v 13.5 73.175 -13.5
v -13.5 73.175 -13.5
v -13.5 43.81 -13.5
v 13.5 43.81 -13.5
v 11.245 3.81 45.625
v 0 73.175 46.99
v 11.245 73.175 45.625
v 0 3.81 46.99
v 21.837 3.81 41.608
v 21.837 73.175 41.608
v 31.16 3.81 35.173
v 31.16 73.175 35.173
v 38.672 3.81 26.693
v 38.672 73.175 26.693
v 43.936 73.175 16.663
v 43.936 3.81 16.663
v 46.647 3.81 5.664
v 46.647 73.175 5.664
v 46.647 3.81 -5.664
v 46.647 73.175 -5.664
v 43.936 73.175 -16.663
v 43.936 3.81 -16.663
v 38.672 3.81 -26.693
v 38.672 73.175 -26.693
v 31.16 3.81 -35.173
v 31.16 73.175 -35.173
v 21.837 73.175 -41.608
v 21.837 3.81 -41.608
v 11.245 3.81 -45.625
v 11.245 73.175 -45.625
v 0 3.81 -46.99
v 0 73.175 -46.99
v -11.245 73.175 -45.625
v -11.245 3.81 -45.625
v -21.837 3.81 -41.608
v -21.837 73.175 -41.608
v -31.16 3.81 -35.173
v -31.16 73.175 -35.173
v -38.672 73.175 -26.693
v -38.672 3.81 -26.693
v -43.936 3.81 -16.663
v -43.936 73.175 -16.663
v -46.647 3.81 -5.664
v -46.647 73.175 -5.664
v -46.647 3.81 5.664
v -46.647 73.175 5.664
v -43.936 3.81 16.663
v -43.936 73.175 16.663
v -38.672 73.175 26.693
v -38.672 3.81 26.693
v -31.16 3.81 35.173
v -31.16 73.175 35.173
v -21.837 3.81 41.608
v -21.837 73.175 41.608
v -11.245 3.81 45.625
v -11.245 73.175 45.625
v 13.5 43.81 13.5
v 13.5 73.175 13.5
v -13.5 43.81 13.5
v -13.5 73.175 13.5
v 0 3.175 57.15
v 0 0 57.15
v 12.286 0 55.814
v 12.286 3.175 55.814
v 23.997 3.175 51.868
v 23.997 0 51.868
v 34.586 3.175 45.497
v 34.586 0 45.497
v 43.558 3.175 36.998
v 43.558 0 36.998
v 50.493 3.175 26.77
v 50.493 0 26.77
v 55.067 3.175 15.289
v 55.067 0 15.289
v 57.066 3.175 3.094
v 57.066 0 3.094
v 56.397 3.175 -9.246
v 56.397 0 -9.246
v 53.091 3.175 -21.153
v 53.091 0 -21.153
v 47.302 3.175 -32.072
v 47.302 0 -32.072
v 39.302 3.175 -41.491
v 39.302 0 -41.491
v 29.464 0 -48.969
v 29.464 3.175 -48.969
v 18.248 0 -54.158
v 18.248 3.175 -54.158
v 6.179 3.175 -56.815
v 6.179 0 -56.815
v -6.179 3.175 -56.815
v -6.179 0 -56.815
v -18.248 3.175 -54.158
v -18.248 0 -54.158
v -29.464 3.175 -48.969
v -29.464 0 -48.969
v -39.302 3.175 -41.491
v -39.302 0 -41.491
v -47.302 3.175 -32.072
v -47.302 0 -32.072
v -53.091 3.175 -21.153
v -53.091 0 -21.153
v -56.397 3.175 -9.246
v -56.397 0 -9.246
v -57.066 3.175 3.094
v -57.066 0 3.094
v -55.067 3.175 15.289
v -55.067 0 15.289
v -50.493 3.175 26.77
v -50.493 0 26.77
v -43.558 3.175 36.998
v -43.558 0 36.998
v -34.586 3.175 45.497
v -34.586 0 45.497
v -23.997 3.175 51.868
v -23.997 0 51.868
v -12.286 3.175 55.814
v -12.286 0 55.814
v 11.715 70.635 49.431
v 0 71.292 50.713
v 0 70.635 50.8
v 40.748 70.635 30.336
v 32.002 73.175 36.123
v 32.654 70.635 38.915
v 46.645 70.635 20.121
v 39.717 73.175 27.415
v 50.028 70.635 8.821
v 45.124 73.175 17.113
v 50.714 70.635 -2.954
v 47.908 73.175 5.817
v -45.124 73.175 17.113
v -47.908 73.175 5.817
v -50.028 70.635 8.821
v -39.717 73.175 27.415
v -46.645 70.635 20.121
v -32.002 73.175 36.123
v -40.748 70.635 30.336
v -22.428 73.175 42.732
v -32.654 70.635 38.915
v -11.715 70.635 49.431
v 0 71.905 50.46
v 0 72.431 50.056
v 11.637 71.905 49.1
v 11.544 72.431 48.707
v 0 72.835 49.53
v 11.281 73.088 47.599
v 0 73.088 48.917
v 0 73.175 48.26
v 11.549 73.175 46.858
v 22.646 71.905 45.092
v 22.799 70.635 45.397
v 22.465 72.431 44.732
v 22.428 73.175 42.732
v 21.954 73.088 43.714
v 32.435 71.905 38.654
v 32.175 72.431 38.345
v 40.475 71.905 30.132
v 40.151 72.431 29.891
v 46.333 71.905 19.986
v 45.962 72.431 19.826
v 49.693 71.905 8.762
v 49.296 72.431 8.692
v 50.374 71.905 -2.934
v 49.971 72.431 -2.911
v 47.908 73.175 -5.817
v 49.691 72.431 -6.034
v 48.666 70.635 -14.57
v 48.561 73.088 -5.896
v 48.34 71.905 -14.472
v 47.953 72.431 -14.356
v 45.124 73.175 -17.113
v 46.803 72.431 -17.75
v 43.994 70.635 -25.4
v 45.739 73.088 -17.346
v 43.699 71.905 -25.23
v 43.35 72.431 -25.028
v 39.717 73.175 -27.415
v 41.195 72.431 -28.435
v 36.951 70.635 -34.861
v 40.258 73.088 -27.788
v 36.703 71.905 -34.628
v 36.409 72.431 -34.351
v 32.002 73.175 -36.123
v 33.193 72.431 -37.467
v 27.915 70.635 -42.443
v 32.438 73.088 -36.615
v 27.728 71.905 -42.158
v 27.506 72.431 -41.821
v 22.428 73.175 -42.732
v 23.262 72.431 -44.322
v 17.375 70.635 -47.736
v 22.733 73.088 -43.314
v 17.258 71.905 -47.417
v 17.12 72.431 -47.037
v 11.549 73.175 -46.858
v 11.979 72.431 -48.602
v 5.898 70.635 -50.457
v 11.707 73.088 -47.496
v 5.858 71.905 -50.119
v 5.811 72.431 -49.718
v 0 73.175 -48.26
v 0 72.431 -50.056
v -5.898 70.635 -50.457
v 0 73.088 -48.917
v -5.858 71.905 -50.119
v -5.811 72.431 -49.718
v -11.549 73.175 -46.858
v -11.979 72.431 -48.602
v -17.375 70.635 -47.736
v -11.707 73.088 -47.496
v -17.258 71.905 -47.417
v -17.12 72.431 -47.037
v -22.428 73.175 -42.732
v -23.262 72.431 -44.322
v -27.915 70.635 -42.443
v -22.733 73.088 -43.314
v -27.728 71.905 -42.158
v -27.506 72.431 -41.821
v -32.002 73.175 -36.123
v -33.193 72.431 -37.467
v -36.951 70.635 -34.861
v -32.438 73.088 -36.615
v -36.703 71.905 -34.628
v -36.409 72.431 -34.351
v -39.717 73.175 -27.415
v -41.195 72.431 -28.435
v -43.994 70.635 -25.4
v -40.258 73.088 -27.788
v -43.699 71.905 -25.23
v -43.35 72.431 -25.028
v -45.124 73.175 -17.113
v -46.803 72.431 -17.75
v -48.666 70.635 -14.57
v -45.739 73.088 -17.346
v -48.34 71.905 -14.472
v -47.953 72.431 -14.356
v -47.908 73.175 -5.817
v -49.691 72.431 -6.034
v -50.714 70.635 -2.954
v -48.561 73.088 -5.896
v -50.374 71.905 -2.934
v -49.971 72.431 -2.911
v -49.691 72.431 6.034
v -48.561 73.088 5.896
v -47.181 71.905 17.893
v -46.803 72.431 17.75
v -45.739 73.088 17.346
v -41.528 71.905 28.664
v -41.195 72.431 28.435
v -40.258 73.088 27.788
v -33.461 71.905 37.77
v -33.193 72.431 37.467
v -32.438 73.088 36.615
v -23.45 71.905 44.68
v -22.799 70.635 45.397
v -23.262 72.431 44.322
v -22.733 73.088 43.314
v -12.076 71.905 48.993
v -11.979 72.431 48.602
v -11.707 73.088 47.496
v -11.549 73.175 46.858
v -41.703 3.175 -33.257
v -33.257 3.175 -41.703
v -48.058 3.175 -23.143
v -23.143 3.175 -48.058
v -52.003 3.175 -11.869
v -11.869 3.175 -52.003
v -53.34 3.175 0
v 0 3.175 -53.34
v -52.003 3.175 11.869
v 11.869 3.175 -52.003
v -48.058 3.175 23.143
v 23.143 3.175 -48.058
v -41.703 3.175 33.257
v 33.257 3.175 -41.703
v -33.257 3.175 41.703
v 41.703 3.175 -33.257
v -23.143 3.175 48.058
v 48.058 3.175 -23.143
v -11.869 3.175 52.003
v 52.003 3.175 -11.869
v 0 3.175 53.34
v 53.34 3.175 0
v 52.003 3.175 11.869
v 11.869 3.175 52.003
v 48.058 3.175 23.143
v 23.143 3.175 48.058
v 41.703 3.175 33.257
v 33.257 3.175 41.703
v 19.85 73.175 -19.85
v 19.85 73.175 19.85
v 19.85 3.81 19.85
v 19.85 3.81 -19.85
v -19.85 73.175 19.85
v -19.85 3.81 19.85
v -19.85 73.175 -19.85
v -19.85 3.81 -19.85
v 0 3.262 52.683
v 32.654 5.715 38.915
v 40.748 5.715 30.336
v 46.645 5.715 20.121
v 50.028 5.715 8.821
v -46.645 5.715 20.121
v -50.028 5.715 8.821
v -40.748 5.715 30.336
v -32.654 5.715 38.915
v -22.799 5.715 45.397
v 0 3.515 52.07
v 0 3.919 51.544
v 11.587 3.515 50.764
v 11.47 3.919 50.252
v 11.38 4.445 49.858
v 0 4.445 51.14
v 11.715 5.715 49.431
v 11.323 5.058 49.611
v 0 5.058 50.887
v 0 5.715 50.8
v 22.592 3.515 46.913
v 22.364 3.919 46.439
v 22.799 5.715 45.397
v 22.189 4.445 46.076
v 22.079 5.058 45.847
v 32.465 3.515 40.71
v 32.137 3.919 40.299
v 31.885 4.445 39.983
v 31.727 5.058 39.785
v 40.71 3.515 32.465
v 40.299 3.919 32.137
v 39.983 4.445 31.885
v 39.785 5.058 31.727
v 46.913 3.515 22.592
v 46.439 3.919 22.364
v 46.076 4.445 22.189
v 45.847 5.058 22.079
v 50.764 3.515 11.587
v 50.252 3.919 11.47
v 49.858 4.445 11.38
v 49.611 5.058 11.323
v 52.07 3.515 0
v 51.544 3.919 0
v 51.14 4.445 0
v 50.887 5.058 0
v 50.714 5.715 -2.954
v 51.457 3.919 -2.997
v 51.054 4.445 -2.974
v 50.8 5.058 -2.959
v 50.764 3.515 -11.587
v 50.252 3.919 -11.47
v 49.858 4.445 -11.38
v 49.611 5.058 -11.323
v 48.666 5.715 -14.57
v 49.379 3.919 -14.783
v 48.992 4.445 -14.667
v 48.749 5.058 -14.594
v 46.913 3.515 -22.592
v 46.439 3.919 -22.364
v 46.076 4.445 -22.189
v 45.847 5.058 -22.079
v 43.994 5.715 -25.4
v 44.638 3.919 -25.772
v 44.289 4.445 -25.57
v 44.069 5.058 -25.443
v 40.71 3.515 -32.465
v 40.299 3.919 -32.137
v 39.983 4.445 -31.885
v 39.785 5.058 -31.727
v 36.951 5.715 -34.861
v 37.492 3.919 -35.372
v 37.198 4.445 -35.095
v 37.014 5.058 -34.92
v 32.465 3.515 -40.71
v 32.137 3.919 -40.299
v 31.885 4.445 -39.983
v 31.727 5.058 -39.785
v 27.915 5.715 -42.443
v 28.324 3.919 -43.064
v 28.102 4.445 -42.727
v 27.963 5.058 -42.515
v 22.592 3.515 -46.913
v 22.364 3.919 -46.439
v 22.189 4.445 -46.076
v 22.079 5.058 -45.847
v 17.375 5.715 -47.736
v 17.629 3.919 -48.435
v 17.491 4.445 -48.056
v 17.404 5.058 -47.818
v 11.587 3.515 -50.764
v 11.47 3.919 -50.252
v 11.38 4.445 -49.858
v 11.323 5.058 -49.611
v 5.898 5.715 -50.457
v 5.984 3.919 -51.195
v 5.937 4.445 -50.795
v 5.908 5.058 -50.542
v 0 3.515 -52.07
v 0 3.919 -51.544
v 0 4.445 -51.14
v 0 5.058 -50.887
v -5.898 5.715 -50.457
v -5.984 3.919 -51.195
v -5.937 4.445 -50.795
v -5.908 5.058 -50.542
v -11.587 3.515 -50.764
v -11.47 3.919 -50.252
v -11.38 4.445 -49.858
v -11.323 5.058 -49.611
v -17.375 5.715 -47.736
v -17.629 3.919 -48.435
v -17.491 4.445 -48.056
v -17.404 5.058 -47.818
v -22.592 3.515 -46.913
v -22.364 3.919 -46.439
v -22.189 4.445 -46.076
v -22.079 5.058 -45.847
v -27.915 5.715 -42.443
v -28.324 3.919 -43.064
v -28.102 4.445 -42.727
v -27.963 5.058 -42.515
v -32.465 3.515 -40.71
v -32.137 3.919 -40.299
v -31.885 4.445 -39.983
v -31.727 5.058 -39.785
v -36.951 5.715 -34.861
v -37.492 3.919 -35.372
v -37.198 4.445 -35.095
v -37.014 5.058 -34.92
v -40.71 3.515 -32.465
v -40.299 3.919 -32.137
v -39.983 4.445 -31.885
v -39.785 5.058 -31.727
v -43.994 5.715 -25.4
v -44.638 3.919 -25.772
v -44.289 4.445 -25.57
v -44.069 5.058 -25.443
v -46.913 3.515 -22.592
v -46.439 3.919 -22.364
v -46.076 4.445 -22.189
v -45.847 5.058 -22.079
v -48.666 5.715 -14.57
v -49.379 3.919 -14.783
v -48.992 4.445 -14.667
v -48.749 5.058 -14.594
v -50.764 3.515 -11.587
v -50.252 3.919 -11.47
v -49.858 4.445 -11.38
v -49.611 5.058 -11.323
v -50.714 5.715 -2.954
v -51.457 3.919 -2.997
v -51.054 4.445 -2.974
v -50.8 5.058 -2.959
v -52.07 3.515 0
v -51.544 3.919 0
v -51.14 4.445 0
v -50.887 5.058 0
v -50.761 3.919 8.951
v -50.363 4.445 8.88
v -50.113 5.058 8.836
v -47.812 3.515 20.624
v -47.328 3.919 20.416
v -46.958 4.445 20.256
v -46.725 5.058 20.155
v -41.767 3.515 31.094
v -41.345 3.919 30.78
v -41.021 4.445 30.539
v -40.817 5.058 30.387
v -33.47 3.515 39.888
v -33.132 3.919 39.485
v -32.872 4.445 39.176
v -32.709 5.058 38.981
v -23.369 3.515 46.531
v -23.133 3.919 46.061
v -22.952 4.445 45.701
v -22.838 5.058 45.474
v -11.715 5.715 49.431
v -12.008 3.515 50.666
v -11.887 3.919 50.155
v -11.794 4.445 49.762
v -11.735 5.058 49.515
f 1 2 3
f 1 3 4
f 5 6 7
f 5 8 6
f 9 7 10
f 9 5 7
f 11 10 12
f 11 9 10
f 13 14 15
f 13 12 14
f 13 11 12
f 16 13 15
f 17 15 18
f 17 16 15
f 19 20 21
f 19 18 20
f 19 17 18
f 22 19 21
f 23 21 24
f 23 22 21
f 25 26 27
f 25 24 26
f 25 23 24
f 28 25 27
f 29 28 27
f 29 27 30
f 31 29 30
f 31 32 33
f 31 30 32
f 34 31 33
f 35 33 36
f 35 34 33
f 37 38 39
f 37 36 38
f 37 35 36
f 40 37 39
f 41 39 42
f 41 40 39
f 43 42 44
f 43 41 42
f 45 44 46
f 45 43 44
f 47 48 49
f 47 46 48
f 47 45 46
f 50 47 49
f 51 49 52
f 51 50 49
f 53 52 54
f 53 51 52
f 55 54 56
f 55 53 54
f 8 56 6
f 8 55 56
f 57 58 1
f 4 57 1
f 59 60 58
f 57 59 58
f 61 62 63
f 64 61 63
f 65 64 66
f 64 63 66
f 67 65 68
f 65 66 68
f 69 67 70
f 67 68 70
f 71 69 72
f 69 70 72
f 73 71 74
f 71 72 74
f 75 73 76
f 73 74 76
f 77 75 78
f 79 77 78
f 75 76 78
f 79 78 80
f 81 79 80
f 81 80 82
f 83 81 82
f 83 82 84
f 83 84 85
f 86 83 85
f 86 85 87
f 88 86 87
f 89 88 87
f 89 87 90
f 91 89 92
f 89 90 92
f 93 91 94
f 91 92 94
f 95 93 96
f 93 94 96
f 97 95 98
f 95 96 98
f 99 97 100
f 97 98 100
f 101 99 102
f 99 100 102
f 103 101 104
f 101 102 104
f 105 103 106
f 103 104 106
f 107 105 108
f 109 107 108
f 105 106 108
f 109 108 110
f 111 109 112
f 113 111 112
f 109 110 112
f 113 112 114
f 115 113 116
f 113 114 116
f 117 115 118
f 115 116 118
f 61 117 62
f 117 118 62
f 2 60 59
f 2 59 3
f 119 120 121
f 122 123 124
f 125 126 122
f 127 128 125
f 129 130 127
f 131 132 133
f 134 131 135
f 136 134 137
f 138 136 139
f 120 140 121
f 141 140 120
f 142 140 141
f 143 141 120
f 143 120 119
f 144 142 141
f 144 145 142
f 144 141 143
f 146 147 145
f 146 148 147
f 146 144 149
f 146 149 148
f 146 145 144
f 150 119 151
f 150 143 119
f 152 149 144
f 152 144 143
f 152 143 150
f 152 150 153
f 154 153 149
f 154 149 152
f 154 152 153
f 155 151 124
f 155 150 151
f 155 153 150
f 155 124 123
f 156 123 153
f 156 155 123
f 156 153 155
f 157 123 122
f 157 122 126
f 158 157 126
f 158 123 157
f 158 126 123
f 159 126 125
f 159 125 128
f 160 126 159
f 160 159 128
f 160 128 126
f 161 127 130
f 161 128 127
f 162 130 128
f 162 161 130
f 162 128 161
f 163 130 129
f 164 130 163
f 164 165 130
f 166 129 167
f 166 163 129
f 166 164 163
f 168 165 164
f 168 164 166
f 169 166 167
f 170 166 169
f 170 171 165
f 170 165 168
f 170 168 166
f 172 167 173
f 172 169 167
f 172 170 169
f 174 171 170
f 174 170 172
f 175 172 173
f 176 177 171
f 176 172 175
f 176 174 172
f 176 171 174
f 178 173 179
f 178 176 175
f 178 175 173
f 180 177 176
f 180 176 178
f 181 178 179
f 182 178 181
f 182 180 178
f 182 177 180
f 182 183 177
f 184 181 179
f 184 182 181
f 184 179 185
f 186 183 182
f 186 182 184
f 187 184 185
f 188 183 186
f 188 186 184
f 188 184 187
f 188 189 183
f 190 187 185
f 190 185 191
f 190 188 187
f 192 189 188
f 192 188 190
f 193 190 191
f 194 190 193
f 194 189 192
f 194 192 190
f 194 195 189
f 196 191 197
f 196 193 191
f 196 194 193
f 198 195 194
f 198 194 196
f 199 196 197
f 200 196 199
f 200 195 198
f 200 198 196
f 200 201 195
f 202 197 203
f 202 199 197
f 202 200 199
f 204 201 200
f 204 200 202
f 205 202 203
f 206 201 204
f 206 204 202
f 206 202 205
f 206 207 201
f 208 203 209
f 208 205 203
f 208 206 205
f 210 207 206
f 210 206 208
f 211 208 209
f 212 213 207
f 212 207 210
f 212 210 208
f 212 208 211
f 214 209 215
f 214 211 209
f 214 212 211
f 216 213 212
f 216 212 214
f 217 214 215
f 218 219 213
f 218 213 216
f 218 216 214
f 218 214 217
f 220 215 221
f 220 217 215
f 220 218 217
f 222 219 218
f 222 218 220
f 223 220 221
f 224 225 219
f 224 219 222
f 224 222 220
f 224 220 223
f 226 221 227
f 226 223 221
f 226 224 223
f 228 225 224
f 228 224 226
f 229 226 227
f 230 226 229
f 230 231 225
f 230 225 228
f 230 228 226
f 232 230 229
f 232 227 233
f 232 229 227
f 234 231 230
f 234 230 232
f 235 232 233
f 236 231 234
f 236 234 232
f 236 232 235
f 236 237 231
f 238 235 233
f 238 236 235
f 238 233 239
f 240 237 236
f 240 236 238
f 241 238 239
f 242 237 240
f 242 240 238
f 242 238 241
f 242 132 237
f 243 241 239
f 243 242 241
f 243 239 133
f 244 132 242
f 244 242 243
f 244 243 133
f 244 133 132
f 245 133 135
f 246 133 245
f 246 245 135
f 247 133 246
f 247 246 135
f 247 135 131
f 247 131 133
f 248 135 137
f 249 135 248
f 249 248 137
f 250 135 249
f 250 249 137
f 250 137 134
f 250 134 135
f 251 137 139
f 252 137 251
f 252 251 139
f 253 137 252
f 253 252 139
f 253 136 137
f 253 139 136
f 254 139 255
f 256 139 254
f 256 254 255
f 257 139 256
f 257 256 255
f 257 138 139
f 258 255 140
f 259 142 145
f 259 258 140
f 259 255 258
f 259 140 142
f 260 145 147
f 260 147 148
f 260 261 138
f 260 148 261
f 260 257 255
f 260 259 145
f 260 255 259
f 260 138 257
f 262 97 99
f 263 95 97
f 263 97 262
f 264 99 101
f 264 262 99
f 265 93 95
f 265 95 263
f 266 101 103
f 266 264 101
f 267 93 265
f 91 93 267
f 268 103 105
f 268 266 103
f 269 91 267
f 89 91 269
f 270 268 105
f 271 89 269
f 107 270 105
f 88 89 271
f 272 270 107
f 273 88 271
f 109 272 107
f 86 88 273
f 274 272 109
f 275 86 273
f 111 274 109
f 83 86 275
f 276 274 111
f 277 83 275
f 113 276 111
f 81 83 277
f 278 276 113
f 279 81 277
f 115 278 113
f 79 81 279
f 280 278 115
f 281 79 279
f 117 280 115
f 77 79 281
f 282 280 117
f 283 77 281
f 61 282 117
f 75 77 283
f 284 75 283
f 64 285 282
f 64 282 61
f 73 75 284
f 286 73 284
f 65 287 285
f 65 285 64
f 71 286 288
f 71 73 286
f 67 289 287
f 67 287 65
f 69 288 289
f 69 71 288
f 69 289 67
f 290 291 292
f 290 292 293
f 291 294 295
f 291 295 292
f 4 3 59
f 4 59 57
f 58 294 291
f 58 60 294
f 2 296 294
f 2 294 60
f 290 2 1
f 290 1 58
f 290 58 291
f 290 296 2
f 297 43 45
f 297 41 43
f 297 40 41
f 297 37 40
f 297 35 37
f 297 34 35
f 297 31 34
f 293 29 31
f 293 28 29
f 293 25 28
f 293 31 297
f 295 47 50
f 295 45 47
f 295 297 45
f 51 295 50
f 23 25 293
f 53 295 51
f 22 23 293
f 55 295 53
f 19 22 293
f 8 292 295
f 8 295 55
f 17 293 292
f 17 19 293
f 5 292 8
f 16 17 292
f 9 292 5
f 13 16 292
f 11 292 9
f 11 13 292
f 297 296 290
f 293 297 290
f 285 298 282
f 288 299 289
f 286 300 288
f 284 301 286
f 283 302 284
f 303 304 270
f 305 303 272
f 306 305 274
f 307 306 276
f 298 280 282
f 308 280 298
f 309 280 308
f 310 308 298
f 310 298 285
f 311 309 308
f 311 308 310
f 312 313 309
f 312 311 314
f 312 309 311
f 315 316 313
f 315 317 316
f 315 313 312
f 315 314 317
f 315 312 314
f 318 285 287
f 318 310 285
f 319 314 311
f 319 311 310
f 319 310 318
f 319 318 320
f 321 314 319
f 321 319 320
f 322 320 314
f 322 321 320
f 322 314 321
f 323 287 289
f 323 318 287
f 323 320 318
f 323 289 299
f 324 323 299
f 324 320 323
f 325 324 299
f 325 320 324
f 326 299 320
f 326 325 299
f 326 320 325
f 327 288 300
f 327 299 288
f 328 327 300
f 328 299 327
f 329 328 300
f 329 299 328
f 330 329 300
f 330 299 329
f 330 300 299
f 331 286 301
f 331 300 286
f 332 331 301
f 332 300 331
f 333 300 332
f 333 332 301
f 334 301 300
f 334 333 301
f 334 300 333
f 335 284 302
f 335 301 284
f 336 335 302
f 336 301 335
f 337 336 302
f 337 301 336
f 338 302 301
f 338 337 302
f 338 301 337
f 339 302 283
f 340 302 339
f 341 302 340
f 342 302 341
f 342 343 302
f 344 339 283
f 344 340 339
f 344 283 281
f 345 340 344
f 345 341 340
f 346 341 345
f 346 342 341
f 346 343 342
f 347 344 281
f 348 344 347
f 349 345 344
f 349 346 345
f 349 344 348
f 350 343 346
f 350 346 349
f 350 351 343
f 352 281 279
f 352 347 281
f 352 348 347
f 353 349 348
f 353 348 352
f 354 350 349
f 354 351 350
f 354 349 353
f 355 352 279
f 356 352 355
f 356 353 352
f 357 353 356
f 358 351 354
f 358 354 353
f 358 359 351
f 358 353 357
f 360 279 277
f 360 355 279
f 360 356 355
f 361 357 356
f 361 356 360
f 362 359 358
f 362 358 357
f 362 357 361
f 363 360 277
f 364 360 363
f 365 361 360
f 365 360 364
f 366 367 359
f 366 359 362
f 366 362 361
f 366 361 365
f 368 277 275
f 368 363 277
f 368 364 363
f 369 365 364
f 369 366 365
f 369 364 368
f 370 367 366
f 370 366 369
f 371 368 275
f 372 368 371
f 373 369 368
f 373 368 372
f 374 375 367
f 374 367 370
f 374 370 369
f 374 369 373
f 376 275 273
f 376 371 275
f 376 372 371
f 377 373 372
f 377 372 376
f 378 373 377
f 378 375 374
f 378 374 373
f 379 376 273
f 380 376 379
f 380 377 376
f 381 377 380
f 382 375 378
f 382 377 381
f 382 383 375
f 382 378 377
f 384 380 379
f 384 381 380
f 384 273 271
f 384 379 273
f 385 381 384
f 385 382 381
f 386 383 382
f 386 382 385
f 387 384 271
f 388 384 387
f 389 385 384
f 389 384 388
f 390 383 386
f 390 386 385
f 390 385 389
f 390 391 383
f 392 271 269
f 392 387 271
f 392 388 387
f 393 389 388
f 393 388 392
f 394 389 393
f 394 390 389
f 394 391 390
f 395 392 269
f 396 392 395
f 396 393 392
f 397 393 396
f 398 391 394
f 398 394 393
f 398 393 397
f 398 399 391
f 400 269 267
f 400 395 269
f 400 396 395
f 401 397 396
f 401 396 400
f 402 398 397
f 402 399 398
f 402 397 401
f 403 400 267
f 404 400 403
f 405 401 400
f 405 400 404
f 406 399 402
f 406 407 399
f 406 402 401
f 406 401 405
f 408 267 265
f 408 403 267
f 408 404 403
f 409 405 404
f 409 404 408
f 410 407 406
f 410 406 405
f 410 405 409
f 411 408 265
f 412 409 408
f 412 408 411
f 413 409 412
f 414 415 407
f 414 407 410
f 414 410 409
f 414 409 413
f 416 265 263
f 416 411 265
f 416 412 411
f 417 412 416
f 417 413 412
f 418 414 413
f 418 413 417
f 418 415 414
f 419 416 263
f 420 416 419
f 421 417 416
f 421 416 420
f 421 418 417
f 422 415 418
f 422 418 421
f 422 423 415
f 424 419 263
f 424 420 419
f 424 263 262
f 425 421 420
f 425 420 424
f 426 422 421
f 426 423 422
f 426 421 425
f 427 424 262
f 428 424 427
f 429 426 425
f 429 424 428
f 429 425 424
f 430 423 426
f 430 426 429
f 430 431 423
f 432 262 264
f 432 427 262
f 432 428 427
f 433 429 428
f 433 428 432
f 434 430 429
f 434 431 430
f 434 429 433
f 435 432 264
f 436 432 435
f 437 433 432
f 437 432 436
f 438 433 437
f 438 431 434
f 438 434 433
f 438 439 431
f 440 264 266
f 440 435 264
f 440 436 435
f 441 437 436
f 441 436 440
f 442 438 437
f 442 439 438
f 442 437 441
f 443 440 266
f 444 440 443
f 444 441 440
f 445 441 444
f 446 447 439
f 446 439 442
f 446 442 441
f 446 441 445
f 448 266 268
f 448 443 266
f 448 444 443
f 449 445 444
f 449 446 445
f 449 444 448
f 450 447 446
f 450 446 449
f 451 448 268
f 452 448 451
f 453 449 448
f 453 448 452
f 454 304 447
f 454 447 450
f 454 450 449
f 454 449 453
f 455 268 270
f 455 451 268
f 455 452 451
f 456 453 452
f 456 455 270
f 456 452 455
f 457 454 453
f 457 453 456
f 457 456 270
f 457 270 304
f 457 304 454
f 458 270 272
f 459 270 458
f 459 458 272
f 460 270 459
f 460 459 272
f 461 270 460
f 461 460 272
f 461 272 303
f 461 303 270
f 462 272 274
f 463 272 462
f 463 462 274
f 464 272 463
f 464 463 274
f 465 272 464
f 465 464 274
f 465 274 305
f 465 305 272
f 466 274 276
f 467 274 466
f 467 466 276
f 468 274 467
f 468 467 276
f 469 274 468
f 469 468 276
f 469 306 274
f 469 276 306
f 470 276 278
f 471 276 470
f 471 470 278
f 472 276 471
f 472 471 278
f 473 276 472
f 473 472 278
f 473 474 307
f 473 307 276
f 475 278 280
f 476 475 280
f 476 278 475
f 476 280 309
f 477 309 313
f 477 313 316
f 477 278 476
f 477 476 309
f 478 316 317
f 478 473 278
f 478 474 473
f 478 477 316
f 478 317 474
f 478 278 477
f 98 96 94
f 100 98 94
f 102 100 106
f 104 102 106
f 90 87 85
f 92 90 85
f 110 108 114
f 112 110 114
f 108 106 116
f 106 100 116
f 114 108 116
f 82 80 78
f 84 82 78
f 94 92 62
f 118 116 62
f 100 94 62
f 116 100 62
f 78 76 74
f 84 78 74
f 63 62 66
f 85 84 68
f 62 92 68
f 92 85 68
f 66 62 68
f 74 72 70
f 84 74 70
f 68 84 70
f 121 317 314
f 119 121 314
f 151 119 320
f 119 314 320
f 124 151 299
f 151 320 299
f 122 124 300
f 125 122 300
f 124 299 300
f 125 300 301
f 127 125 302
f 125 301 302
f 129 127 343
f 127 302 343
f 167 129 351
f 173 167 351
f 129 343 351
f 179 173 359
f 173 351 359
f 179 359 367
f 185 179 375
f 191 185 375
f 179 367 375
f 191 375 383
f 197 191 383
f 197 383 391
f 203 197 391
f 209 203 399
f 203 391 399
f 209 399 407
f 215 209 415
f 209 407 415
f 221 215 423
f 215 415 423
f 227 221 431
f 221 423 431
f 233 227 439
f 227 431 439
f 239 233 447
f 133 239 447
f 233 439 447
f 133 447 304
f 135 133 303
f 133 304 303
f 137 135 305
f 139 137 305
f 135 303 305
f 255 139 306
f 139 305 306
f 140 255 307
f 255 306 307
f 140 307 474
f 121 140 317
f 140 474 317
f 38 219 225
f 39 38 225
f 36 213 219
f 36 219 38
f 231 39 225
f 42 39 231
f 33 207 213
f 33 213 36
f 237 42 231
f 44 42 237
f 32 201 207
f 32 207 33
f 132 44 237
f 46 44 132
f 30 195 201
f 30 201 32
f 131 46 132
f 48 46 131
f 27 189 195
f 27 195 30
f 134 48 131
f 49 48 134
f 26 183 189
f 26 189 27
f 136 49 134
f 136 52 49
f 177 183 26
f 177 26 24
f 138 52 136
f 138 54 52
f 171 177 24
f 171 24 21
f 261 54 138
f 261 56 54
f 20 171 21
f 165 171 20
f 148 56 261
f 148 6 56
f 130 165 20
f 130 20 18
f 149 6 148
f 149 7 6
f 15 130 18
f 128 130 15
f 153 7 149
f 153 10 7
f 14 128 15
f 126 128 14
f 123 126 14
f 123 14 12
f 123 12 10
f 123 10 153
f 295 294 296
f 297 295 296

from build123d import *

# Parameters (mm, degrees)
SKETCH1_R           = 57.15
BOSS_EXTRUDE1_DEPTH = 3.175
SKETCH2_R           = 50.8
BOSS_EXTRUDE2_DEPTH = 70
SHELL3_T            = -3.81
BOSS_EXTRUDE3_REACH = 111.027
SKETCH3_W           = 39.7
SKETCH3_H           = 39.7
SKETCH3_W_2         = 27
SKETCH3_H_2         = 27
FILLET2_R           = 2.54
SKETCH4_W           = 27
SKETCH4_H           = 27
BOSS_EXTRUDE5_DEPTH = 40


with BuildPart() as part:
    # Sketch1 → Boss-Extrude1 (new body)
    with BuildSketch(Plane(origin=(0, 0, 0), x_dir=(1, 0, 0), z_dir=(0, 1, 0))):
        with Locations(Location((0, 0, 0), (0, 0, 270))):
            Circle(SKETCH1_R)
    extrude(amount=BOSS_EXTRUDE1_DEPTH)

    # Sketch2 → Boss-Extrude2 (add)
    with BuildSketch(Plane(origin=(0, 3.175, 0), x_dir=(1, 0, 0), z_dir=(0, 1, 0))):
        with Locations(Location((0, 0, 0), (0, 0, 270))):
            Circle(SKETCH2_R)
    extrude(amount=BOSS_EXTRUDE2_DEPTH)

    # Shell3
    shell3_openings = [part.faces().sort_by_distance(p)[0] for p in [
        (0, 73.175, 0),
    ]]
    offset(amount=SHELL3_T, openings=shell3_openings, kind=Kind.INTERSECTION)

    # Sketch3 → Boss-Extrude3 (add, up to next)
    with BuildSketch(Plane(origin=(0, 73.175, 0), x_dir=(1, 0, 0), z_dir=(0, 1, 0)), mode=Mode.PRIVATE) as boss_extrude3_sk1:
        Rectangle(SKETCH3_W, SKETCH3_H)
        Rectangle(SKETCH3_W_2, SKETCH3_H_2, mode=Mode.SUBTRACT)
    boss_extrude3_tool1 = extrude(boss_extrude3_sk1.sketch, amount=-BOSS_EXTRUDE3_REACH, mode=Mode.PRIVATE) - part.part
    add(boss_extrude3_tool1.solids().sort_by_distance((0, 73.175, -19.288557))[0])

    # Fillet2
    fillet2_edges = [part.edges().sort_by_distance(p)[0] for p in [
        (0, 3.175, -50.8),
        (0, 73.175, -50.8),
    ]]
    fillet(fillet2_edges, radius=FILLET2_R)

    # Sketch4 → Boss-Extrude5 (add)
    with BuildSketch(Plane(origin=(0, 3.81, 0), x_dir=(1, 0, 0), z_dir=(0, 1, 0))):
        Rectangle(SKETCH4_W, SKETCH4_H)
    extrude(amount=BOSS_EXTRUDE5_DEPTH)


solid = part.part
